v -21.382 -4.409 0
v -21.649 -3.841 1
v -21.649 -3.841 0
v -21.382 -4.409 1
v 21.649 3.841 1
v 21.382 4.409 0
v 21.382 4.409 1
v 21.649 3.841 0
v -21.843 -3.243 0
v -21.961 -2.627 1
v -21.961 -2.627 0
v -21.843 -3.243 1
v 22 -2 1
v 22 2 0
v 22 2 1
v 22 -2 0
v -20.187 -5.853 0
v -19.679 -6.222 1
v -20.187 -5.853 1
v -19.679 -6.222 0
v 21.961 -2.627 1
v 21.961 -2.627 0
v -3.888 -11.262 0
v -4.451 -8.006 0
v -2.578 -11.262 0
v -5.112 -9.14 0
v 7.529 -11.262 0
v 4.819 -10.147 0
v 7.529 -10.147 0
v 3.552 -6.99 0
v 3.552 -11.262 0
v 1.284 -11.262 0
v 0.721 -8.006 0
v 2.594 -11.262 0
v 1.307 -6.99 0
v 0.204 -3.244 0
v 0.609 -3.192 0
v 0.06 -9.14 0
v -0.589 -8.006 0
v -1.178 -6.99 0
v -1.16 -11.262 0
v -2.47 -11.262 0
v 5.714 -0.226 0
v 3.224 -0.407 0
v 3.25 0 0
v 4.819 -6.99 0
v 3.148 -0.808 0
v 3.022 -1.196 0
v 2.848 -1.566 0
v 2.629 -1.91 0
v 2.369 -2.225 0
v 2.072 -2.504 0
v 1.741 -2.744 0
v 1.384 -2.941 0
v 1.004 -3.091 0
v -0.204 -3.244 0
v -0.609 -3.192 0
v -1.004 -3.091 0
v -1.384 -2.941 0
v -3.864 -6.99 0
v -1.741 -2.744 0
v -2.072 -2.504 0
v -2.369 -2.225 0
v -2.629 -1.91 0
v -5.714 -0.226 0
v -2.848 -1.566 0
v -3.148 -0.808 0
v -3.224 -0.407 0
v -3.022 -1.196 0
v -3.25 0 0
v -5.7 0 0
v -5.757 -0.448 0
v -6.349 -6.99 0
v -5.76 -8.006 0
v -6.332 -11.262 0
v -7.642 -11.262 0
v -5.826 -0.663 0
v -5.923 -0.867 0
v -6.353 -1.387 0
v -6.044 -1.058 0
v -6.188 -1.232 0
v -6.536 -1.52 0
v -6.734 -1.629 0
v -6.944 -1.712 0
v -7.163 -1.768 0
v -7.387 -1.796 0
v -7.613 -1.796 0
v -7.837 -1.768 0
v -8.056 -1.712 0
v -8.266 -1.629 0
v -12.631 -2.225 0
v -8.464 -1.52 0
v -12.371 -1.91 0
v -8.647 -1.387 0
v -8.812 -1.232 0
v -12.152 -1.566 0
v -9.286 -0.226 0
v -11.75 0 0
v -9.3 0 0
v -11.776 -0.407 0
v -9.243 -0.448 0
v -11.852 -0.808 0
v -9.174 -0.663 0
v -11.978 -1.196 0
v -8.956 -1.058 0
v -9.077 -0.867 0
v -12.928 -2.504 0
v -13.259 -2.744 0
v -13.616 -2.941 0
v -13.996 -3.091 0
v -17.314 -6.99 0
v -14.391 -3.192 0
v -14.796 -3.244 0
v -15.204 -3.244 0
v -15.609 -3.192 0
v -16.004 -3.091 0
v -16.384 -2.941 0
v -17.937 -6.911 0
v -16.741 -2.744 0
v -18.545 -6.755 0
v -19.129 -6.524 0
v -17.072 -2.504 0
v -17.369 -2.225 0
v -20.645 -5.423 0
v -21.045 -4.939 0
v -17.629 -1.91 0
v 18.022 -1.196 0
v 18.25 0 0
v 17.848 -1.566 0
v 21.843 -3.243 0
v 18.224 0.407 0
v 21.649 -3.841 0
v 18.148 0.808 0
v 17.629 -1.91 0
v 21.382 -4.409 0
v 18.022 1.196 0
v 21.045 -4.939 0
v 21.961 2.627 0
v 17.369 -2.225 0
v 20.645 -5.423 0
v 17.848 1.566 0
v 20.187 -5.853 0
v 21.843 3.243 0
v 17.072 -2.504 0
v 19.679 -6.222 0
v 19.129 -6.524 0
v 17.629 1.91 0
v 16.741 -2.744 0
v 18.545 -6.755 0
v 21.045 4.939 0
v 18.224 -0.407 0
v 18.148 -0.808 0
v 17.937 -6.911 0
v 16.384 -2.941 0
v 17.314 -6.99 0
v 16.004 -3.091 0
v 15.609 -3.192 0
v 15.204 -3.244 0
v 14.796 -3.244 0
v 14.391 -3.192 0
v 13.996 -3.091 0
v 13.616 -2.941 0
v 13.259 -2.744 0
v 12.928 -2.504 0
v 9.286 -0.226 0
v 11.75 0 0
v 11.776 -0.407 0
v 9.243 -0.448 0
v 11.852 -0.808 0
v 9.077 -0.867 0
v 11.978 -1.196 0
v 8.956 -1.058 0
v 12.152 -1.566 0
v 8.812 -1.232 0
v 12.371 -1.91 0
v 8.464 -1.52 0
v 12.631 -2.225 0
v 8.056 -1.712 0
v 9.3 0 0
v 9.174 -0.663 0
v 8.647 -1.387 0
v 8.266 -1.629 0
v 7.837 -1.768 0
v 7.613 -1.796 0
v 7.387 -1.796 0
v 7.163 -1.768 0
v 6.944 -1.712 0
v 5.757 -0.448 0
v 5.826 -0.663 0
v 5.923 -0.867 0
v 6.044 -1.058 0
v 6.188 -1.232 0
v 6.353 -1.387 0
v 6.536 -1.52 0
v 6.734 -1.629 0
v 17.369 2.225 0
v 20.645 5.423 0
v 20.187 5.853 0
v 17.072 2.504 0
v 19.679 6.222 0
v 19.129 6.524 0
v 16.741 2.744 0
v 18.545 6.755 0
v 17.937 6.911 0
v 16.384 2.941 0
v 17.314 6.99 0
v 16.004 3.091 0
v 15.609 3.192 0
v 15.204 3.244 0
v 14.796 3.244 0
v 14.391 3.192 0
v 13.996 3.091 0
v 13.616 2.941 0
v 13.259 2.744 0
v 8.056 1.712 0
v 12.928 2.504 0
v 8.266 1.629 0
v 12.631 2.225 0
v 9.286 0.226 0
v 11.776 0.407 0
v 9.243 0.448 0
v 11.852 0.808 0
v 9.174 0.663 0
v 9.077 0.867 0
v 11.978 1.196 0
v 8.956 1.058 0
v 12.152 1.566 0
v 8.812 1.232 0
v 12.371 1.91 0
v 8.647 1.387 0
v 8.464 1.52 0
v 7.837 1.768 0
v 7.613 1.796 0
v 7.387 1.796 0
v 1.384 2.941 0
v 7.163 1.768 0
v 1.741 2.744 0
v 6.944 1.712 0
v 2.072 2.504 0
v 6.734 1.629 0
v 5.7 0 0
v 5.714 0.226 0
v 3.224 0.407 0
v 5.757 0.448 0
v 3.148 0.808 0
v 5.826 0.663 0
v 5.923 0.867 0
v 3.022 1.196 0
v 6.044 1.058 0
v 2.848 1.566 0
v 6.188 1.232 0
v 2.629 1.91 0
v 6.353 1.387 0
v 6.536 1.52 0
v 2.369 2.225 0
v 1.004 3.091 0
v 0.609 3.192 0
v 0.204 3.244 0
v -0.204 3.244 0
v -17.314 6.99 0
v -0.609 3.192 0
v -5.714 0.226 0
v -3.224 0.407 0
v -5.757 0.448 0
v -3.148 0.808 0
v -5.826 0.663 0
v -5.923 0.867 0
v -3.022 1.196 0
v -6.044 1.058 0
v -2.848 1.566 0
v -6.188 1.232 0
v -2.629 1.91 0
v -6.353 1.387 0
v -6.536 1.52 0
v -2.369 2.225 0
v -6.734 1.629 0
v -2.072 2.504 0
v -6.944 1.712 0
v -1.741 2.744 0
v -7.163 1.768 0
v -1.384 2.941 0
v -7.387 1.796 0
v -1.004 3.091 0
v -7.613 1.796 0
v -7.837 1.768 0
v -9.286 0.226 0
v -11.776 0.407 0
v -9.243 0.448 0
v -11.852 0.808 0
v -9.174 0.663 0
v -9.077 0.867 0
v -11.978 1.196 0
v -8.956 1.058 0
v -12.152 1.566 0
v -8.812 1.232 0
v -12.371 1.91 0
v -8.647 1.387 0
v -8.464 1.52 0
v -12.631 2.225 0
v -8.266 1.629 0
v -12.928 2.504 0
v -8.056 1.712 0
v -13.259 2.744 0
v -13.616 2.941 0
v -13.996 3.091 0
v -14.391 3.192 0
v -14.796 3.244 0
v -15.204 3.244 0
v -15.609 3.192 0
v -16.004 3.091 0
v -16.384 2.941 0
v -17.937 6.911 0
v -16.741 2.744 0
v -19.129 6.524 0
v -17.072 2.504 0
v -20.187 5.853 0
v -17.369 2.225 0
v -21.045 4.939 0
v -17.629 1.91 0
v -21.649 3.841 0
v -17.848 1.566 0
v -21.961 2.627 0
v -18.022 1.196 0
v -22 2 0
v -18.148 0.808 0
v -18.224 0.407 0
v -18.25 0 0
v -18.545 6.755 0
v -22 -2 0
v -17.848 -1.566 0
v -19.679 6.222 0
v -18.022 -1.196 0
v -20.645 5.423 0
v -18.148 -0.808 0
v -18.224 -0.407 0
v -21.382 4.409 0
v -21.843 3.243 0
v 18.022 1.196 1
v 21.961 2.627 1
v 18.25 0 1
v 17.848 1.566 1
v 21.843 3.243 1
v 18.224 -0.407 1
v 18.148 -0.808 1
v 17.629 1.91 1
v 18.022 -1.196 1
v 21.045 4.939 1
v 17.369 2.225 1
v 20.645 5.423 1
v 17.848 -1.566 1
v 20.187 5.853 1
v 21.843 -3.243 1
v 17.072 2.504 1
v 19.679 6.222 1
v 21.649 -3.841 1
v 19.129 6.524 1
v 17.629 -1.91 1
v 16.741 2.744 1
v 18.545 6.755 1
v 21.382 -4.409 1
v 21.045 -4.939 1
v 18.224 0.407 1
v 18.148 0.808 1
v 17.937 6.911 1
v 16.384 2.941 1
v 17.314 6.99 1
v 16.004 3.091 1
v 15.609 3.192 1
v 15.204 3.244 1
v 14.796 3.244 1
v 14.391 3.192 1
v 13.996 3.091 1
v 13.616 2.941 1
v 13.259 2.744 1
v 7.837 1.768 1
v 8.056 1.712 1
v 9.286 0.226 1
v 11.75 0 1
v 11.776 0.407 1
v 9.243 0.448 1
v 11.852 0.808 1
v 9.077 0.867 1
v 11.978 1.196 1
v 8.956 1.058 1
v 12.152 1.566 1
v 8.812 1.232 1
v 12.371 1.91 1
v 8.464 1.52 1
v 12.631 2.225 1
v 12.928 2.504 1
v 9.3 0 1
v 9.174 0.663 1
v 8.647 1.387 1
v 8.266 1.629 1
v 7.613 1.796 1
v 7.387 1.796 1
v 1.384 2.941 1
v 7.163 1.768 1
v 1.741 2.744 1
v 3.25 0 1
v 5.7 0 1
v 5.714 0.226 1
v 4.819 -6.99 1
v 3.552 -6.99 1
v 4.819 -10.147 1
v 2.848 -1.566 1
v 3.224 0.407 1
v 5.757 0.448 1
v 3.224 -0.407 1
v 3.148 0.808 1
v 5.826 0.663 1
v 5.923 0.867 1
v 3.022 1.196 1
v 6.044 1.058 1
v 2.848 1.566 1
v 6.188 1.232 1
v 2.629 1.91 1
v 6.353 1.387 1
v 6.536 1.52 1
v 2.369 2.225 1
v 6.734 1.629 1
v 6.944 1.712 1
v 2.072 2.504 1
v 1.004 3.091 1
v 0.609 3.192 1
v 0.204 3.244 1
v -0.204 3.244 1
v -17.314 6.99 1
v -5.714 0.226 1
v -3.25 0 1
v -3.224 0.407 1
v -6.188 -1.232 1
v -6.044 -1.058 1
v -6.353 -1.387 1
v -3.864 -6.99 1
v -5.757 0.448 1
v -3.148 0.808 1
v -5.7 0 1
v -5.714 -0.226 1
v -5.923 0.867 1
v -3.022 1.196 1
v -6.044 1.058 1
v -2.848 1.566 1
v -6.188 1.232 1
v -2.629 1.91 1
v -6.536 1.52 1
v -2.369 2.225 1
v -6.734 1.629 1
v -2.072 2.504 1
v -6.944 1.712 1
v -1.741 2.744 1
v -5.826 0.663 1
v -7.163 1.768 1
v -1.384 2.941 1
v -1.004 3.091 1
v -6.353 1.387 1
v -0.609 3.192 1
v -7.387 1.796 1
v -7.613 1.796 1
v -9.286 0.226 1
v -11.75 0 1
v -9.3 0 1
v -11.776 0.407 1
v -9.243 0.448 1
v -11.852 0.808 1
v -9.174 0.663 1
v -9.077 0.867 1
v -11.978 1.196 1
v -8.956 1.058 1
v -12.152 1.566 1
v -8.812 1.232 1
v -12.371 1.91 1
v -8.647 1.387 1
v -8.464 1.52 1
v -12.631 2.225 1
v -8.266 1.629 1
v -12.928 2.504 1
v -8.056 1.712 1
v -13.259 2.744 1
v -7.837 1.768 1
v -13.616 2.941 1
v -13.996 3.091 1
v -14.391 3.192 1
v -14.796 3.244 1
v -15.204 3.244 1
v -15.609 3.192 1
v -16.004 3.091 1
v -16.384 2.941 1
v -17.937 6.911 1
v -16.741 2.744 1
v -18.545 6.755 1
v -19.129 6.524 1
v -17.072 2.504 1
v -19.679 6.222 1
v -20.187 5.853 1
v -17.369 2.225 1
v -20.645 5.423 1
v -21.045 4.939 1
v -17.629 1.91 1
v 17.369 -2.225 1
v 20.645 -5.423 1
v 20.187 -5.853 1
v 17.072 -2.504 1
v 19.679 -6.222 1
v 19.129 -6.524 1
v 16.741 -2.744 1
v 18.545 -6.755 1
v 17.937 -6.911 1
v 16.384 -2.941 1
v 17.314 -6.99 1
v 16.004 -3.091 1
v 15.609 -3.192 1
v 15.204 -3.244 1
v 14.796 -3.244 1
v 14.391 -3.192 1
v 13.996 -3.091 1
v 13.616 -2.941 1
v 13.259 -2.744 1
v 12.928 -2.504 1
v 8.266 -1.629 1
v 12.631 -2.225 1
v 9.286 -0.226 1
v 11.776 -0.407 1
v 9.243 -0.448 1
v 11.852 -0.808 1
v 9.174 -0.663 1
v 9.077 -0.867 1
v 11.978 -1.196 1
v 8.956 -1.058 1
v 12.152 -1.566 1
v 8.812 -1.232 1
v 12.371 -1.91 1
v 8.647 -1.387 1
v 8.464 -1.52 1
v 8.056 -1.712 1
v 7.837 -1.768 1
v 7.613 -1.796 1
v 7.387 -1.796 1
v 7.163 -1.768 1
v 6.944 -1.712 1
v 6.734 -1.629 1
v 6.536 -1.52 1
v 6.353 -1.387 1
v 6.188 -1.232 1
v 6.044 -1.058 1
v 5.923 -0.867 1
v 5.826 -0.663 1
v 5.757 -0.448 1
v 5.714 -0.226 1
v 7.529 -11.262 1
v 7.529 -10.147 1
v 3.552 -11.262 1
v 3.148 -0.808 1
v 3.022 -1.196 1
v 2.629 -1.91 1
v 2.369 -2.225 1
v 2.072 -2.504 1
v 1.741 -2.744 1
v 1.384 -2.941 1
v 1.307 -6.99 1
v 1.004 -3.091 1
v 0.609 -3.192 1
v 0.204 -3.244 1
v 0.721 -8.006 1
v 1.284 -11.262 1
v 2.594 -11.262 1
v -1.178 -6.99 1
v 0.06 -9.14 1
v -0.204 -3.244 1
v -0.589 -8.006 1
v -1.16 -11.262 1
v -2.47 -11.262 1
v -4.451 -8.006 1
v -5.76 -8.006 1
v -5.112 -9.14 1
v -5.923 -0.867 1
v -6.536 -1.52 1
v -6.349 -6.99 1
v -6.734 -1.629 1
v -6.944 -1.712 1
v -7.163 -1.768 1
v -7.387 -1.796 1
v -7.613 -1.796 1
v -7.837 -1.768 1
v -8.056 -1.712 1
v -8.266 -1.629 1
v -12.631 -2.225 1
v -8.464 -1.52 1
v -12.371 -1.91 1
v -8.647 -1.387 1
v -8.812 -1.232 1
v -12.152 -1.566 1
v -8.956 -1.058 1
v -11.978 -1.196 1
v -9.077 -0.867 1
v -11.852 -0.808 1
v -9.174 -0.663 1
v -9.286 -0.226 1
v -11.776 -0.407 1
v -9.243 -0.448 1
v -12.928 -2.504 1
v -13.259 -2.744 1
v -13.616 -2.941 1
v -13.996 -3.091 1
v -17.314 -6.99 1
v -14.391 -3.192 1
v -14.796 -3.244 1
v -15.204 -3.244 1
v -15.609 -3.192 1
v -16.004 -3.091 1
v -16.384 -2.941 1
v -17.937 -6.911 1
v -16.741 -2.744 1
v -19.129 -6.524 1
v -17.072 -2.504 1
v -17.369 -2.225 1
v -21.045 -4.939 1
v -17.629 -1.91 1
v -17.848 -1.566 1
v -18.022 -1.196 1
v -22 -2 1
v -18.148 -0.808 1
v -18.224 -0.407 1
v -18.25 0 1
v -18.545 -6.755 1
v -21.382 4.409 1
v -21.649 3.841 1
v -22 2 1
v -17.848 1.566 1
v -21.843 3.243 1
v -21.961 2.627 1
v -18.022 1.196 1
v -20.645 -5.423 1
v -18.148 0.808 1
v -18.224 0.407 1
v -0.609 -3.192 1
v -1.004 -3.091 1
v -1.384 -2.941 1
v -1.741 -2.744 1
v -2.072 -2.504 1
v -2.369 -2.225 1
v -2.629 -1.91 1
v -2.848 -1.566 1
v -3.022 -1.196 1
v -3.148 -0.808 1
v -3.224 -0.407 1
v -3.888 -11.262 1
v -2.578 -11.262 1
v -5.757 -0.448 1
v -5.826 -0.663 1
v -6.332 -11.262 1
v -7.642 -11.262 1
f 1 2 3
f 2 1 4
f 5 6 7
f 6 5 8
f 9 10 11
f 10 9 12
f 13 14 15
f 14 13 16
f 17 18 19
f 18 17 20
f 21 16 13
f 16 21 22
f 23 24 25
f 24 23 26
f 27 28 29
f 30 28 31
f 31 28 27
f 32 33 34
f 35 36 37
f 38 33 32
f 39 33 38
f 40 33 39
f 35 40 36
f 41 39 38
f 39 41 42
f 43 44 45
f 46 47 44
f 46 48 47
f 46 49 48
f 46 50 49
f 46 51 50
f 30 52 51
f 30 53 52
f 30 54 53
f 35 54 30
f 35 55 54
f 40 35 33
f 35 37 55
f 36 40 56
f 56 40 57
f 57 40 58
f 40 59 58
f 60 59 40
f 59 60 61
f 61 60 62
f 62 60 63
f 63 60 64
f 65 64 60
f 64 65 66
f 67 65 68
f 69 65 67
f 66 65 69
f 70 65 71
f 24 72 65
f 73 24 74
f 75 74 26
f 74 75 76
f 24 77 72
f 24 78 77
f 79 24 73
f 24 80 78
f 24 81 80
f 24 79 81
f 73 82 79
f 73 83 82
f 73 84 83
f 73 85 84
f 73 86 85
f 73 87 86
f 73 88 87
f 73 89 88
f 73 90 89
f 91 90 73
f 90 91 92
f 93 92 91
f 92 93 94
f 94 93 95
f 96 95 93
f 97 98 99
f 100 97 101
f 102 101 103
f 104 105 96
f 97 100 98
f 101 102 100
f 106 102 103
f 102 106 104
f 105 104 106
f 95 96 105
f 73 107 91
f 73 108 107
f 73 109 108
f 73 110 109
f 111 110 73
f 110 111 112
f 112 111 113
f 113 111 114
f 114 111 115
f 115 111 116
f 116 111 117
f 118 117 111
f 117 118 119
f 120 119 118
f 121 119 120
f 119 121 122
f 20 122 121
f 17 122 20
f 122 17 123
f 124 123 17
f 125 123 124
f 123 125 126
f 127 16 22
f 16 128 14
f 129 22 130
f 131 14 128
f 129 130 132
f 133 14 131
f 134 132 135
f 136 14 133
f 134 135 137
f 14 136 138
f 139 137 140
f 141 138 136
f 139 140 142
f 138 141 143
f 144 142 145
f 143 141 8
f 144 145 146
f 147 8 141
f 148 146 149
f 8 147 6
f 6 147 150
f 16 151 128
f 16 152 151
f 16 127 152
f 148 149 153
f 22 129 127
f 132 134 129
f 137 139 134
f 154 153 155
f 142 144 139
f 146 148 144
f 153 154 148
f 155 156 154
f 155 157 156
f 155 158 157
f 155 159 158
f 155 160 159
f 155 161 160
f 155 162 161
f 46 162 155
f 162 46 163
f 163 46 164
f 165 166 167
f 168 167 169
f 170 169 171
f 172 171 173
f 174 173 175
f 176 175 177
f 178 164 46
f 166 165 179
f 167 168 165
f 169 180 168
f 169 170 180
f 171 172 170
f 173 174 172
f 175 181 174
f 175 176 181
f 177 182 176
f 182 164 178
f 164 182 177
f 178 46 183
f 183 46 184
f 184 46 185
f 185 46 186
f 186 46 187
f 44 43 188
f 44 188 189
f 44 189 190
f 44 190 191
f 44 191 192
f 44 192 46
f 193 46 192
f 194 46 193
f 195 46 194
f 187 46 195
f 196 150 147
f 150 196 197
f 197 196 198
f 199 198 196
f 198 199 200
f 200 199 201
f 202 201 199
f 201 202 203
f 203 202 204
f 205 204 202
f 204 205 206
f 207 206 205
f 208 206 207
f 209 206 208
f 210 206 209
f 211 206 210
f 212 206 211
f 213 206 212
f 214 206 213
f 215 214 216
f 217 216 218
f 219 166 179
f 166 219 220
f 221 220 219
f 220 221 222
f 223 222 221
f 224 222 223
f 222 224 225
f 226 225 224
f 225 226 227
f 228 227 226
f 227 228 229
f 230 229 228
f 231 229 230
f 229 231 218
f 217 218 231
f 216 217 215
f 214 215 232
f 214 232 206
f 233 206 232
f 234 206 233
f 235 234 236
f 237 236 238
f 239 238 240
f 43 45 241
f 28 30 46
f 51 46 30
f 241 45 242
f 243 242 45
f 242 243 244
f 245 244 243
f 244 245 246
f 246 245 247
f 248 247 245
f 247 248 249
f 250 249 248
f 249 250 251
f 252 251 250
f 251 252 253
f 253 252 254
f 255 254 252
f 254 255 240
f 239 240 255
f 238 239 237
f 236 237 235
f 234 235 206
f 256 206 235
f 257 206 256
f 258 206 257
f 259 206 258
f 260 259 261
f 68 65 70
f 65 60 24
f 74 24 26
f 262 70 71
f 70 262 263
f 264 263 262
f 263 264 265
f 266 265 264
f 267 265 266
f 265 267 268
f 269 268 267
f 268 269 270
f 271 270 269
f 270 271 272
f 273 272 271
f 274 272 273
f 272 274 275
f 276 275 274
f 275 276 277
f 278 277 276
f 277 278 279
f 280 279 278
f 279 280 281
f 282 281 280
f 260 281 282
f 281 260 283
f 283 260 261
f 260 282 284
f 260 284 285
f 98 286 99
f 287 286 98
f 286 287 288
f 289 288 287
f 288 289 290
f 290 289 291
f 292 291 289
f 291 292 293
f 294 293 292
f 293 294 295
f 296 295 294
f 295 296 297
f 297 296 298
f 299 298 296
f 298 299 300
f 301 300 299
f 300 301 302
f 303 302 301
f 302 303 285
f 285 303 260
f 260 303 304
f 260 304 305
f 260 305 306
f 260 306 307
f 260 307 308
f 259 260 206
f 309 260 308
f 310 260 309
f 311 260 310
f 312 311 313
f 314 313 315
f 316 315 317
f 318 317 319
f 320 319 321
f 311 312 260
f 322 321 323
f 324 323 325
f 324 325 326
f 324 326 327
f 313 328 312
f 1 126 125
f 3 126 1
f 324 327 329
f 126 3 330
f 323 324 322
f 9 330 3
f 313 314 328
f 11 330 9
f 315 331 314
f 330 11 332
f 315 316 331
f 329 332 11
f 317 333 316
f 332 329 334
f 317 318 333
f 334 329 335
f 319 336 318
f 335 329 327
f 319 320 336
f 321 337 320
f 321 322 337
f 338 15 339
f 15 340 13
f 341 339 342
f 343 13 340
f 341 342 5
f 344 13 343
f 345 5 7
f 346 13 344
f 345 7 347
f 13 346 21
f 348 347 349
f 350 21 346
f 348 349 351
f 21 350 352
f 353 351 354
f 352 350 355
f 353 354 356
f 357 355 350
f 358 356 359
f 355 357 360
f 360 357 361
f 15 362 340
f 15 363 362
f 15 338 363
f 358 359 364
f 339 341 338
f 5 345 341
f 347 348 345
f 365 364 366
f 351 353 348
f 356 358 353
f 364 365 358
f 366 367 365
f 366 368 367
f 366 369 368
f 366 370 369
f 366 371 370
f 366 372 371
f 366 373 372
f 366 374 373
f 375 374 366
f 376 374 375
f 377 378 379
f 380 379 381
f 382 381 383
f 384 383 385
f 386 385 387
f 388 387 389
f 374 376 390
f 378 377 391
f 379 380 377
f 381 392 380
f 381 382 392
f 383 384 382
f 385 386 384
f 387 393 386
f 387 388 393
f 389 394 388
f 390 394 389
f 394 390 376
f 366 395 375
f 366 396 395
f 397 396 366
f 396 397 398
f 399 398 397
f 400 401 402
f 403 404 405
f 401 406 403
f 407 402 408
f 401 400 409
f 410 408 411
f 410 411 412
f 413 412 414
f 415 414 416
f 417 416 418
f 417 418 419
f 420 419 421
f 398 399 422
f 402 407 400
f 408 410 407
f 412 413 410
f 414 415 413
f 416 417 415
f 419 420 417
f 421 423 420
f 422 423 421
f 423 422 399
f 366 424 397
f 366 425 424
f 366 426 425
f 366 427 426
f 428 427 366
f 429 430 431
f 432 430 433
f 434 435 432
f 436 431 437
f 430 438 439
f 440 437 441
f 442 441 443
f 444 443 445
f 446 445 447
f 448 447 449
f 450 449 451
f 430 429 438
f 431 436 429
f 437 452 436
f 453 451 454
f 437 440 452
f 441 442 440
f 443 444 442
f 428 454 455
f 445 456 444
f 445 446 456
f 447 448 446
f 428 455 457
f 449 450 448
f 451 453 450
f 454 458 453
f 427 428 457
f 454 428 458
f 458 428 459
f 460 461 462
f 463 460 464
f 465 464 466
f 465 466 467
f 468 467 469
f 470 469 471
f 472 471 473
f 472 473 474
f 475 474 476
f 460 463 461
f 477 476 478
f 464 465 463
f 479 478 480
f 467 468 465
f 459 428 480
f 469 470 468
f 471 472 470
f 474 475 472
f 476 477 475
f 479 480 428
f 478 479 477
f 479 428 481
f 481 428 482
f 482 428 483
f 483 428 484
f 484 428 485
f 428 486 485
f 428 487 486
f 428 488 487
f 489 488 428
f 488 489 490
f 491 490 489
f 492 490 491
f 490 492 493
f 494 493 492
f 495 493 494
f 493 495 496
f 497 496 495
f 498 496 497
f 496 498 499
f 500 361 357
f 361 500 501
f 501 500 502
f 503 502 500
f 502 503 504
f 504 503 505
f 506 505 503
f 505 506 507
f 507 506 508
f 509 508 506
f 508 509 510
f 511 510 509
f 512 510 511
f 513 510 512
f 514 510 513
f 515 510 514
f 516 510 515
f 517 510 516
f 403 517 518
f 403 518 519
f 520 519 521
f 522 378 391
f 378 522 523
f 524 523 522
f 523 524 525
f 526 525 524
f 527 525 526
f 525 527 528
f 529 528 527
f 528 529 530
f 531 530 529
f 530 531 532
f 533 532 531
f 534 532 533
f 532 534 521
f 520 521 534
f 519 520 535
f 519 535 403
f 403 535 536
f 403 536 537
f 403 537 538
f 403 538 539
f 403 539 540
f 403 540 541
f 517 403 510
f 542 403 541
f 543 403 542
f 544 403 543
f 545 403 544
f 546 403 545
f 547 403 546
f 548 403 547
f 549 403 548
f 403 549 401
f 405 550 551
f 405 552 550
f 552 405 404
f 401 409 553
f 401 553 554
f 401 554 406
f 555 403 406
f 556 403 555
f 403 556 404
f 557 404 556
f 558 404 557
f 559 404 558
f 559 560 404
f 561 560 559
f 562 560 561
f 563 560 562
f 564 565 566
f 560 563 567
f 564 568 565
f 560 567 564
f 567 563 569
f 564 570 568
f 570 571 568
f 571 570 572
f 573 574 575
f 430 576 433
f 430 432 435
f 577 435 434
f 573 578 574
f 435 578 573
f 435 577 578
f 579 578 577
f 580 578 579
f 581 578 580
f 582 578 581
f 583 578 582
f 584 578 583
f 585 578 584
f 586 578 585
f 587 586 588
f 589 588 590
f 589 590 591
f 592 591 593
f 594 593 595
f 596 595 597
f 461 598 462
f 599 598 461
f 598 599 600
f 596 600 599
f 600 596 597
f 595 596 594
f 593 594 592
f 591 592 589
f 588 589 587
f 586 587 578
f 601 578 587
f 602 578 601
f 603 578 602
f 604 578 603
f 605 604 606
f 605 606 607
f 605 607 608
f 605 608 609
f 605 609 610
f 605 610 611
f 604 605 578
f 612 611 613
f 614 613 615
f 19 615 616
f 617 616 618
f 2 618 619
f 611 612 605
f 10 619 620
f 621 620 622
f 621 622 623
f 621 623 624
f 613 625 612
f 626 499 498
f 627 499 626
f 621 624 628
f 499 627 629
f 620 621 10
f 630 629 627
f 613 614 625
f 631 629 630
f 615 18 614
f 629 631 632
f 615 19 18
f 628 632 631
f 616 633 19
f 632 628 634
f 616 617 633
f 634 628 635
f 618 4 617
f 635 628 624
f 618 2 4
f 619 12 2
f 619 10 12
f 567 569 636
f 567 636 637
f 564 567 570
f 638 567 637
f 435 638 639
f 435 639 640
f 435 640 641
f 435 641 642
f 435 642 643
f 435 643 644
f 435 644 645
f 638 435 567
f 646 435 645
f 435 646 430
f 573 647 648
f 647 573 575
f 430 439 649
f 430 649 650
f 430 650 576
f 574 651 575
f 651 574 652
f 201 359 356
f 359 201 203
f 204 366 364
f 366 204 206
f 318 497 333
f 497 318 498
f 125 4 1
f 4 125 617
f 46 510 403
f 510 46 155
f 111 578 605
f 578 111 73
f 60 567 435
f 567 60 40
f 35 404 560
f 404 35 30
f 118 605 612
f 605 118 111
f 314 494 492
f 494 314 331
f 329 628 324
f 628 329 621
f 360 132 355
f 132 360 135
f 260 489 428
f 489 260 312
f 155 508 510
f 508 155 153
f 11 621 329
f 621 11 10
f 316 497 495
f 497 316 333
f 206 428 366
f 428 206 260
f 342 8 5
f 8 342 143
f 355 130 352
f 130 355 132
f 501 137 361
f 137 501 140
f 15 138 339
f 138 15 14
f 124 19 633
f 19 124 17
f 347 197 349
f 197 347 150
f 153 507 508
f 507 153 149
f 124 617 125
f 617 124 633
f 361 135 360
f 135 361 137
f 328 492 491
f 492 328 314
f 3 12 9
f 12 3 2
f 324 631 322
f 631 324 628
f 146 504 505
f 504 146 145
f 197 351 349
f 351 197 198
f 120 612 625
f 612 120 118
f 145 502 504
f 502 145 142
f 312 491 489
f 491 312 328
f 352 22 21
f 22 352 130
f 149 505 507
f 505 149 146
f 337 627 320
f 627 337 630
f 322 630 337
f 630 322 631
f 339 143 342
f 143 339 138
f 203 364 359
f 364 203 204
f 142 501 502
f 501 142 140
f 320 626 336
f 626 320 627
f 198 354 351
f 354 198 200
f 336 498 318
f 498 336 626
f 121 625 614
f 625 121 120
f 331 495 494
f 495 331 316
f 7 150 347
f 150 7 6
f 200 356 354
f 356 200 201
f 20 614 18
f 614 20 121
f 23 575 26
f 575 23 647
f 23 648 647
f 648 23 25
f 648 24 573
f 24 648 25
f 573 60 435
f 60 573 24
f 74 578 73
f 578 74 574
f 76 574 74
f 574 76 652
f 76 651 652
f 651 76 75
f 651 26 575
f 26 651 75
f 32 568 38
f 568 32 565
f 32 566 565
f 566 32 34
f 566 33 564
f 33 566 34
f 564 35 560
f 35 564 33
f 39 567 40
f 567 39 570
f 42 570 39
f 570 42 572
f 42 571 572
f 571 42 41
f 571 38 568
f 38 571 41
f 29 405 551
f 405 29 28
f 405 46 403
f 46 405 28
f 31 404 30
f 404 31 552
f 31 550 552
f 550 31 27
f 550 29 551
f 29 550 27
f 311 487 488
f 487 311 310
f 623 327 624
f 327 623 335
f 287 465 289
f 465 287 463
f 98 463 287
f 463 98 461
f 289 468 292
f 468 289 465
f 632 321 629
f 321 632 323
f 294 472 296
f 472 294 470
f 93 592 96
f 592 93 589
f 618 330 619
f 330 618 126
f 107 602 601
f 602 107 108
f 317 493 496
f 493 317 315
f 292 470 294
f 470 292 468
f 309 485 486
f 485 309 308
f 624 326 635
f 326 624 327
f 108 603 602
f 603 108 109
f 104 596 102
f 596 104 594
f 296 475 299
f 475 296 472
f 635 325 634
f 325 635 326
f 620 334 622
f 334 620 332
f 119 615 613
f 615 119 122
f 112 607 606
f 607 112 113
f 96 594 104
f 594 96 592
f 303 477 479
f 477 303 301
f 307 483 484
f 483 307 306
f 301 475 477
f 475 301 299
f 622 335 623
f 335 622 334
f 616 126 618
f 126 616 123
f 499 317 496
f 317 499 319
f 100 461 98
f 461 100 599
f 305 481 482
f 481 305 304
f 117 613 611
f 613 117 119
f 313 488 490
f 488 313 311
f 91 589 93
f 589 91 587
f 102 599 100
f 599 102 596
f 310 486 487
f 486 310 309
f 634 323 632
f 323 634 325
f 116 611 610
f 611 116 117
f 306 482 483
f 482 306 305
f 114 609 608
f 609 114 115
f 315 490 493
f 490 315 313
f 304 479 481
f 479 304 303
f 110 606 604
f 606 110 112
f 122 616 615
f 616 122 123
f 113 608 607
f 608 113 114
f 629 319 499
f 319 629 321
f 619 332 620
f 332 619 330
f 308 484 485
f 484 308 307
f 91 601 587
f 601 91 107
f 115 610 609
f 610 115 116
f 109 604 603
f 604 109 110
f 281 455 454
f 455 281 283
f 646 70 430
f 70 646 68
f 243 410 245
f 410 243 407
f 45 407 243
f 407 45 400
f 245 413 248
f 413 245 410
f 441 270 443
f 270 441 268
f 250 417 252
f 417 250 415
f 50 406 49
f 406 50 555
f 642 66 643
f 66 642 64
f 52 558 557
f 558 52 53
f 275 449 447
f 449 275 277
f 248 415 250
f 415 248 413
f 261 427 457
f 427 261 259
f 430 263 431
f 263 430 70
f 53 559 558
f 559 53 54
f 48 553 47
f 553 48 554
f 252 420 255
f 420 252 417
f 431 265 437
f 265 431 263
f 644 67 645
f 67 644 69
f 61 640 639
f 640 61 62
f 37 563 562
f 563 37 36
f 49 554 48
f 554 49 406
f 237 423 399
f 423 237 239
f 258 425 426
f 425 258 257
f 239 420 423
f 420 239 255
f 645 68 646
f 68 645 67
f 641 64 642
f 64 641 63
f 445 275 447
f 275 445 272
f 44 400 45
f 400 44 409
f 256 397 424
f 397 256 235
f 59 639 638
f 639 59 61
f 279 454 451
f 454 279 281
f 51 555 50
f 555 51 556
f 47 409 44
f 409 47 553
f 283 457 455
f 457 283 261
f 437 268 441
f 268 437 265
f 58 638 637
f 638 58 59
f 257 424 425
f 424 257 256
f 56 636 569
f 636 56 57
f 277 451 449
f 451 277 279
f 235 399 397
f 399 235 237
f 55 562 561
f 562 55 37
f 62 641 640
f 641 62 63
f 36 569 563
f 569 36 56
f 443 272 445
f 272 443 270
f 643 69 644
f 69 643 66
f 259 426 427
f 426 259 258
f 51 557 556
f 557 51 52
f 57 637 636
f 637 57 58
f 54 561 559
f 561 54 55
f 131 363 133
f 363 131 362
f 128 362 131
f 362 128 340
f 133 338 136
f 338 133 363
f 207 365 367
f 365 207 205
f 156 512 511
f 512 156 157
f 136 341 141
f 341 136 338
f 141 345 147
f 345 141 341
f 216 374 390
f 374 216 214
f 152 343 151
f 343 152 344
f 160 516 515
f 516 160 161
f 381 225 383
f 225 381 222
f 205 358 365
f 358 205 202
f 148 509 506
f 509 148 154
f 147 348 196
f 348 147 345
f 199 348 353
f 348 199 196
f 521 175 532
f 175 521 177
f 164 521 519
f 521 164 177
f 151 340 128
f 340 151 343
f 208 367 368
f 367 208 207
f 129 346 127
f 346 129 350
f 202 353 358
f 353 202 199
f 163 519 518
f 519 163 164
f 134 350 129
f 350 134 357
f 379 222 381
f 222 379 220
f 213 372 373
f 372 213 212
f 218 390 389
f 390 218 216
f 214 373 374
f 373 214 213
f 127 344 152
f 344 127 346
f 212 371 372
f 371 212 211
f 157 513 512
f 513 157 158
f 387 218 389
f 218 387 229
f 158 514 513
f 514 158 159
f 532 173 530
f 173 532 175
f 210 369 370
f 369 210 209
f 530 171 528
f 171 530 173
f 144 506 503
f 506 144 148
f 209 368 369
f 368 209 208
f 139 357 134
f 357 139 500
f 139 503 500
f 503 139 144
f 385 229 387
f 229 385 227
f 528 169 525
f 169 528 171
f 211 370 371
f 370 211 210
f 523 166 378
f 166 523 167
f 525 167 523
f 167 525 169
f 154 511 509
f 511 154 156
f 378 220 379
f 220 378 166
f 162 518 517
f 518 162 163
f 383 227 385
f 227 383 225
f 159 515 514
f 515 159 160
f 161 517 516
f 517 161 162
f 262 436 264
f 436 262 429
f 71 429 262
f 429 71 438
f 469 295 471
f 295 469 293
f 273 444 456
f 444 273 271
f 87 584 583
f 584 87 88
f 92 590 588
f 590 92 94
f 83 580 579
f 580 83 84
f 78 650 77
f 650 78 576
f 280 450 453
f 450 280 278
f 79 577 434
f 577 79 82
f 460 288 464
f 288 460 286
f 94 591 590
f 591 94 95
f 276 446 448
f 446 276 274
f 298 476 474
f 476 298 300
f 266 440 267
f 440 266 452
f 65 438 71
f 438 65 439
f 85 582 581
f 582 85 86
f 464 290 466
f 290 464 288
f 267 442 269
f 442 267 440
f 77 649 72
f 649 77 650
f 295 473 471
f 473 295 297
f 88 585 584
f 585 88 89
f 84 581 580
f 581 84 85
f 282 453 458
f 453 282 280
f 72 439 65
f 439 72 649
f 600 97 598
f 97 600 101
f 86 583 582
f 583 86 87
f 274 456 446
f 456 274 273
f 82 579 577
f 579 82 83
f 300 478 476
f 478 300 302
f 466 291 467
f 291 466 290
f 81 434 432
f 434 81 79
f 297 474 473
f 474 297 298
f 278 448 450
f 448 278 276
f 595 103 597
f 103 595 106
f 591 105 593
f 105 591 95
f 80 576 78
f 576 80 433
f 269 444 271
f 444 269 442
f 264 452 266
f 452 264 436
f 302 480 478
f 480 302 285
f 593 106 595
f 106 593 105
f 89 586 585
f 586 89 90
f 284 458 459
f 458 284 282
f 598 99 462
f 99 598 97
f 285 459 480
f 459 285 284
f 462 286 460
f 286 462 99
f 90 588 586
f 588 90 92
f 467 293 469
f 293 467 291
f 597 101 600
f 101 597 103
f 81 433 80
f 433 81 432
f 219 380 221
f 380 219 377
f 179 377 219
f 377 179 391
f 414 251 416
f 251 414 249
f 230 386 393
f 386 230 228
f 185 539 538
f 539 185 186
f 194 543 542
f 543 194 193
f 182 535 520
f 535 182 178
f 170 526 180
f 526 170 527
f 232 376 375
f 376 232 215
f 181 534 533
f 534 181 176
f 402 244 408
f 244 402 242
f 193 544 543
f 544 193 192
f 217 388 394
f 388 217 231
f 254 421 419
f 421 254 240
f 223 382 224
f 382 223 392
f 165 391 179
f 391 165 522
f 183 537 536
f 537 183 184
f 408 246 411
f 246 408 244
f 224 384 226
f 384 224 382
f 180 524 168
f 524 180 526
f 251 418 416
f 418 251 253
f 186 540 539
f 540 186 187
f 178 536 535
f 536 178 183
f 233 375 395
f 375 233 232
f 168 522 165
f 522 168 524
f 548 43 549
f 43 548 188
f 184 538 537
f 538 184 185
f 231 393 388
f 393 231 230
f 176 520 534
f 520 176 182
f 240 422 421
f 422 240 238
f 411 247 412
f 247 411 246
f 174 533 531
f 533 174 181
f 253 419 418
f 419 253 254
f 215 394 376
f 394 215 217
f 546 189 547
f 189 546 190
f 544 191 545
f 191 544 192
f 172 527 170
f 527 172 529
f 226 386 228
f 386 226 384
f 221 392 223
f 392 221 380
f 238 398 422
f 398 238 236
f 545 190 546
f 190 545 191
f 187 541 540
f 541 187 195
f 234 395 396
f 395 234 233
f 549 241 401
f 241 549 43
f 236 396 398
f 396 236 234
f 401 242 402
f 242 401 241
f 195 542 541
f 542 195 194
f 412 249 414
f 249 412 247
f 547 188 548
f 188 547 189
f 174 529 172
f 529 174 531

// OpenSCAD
$fn = 50;


difference() {
	union() {
		hull() {
			translate(v = [-17.0000000000, 2.0000000000, 0]) {
				cylinder(h = 1, r = 5);
			}
			translate(v = [17.0000000000, 2.0000000000, 0]) {
				cylinder(h = 1, r = 5);
			}
			translate(v = [-17.0000000000, -2.0000000000, 0]) {
				cylinder(h = 1, r = 5);
			}
			translate(v = [17.0000000000, -2.0000000000, 0]) {
				cylinder(h = 1, r = 5);
			}
		}
		translate(v = [0, -5, 0]) {
			linear_extrude(height = 1) {
				text(font = "DejaVu Sans Mono:style=Bold", halign = "center", size = 6.3333333333, text = "XXL", valign = "top");
			}
		}
	}
	union() {
		translate(v = [-15.0000000000, 0.0000000000, 0]) {
			translate(v = [0, 0, -100]) {
				cylinder(h = 200, r = 3.2500000000);
			}
		}
		translate(v = [0, 0, -100]) {
			cylinder(h = 200, r = 3.2500000000);
		}
		translate(v = [15.0000000000, 0.0000000000, 0]) {
			translate(v = [0, 0, -100]) {
				cylinder(h = 200, r = 3.2500000000);
			}
		}
		translate(v = [-15.0000000000, 0.0000000000, 0]) {
			translate(v = [0, 0, -100]) {
				cylinder(h = 200, r = 1.8000000000);
			}
		}
		translate(v = [-7.5000000000, 0.0000000000, 0]) {
			translate(v = [0, 0, -100]) {
				cylinder(h = 200, r = 1.8000000000);
			}
		}
		translate(v = [0, 0, -100]) {
			cylinder(h = 200, r = 1.8000000000);
		}
		translate(v = [7.5000000000, 0.0000000000, 0]) {
			translate(v = [0, 0, -100]) {
				cylinder(h = 200, r = 1.8000000000);
			}
		}
		translate(v = [15.0000000000, 0.0000000000, 0]) {
			translate(v = [0, 0, -100]) {
				cylinder(h = 200, r = 1.8000000000);
			}
		}
	}
}
